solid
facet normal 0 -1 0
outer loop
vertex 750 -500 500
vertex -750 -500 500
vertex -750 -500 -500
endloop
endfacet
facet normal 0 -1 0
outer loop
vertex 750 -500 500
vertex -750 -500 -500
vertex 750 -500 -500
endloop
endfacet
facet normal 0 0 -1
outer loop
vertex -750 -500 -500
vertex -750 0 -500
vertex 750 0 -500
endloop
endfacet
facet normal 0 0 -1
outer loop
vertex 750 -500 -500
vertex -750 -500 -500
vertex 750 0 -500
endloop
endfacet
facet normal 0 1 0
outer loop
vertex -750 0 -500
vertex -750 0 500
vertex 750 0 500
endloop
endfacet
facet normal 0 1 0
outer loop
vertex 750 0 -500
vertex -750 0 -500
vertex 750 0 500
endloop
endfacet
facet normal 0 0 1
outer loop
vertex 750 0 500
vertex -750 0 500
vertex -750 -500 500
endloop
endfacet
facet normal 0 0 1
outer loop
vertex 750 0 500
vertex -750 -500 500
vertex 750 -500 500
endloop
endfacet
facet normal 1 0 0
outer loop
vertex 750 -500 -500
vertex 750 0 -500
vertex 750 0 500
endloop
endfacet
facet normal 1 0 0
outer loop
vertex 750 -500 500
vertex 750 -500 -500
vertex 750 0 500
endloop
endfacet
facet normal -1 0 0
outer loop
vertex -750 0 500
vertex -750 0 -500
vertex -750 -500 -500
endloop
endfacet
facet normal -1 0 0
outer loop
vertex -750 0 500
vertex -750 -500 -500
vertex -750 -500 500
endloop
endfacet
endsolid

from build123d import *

# Parameters (mm, degrees)
F0_W     = 1500
F0_H     = 1000
F1_DEPTH = 500
F3_W     = 1500
F3_H     = 1000
F4_DEPTH = 50


with BuildPart() as f1:
    # F0 (on Front) → F1 (new body)
    with BuildSketch(Plane.XZ):
        Rectangle(F0_W, F0_H)
    extrude(amount=F1_DEPTH)


with BuildPart() as f4:
    # F3 (on face) → F4 (new body)
    with BuildSketch(Plane.XZ.offset(500)):
        with Locations((-1584.334999, 500)):
            Rectangle(F3_W, F3_H)
    extrude(amount=F4_DEPTH)


solid = f1.part
